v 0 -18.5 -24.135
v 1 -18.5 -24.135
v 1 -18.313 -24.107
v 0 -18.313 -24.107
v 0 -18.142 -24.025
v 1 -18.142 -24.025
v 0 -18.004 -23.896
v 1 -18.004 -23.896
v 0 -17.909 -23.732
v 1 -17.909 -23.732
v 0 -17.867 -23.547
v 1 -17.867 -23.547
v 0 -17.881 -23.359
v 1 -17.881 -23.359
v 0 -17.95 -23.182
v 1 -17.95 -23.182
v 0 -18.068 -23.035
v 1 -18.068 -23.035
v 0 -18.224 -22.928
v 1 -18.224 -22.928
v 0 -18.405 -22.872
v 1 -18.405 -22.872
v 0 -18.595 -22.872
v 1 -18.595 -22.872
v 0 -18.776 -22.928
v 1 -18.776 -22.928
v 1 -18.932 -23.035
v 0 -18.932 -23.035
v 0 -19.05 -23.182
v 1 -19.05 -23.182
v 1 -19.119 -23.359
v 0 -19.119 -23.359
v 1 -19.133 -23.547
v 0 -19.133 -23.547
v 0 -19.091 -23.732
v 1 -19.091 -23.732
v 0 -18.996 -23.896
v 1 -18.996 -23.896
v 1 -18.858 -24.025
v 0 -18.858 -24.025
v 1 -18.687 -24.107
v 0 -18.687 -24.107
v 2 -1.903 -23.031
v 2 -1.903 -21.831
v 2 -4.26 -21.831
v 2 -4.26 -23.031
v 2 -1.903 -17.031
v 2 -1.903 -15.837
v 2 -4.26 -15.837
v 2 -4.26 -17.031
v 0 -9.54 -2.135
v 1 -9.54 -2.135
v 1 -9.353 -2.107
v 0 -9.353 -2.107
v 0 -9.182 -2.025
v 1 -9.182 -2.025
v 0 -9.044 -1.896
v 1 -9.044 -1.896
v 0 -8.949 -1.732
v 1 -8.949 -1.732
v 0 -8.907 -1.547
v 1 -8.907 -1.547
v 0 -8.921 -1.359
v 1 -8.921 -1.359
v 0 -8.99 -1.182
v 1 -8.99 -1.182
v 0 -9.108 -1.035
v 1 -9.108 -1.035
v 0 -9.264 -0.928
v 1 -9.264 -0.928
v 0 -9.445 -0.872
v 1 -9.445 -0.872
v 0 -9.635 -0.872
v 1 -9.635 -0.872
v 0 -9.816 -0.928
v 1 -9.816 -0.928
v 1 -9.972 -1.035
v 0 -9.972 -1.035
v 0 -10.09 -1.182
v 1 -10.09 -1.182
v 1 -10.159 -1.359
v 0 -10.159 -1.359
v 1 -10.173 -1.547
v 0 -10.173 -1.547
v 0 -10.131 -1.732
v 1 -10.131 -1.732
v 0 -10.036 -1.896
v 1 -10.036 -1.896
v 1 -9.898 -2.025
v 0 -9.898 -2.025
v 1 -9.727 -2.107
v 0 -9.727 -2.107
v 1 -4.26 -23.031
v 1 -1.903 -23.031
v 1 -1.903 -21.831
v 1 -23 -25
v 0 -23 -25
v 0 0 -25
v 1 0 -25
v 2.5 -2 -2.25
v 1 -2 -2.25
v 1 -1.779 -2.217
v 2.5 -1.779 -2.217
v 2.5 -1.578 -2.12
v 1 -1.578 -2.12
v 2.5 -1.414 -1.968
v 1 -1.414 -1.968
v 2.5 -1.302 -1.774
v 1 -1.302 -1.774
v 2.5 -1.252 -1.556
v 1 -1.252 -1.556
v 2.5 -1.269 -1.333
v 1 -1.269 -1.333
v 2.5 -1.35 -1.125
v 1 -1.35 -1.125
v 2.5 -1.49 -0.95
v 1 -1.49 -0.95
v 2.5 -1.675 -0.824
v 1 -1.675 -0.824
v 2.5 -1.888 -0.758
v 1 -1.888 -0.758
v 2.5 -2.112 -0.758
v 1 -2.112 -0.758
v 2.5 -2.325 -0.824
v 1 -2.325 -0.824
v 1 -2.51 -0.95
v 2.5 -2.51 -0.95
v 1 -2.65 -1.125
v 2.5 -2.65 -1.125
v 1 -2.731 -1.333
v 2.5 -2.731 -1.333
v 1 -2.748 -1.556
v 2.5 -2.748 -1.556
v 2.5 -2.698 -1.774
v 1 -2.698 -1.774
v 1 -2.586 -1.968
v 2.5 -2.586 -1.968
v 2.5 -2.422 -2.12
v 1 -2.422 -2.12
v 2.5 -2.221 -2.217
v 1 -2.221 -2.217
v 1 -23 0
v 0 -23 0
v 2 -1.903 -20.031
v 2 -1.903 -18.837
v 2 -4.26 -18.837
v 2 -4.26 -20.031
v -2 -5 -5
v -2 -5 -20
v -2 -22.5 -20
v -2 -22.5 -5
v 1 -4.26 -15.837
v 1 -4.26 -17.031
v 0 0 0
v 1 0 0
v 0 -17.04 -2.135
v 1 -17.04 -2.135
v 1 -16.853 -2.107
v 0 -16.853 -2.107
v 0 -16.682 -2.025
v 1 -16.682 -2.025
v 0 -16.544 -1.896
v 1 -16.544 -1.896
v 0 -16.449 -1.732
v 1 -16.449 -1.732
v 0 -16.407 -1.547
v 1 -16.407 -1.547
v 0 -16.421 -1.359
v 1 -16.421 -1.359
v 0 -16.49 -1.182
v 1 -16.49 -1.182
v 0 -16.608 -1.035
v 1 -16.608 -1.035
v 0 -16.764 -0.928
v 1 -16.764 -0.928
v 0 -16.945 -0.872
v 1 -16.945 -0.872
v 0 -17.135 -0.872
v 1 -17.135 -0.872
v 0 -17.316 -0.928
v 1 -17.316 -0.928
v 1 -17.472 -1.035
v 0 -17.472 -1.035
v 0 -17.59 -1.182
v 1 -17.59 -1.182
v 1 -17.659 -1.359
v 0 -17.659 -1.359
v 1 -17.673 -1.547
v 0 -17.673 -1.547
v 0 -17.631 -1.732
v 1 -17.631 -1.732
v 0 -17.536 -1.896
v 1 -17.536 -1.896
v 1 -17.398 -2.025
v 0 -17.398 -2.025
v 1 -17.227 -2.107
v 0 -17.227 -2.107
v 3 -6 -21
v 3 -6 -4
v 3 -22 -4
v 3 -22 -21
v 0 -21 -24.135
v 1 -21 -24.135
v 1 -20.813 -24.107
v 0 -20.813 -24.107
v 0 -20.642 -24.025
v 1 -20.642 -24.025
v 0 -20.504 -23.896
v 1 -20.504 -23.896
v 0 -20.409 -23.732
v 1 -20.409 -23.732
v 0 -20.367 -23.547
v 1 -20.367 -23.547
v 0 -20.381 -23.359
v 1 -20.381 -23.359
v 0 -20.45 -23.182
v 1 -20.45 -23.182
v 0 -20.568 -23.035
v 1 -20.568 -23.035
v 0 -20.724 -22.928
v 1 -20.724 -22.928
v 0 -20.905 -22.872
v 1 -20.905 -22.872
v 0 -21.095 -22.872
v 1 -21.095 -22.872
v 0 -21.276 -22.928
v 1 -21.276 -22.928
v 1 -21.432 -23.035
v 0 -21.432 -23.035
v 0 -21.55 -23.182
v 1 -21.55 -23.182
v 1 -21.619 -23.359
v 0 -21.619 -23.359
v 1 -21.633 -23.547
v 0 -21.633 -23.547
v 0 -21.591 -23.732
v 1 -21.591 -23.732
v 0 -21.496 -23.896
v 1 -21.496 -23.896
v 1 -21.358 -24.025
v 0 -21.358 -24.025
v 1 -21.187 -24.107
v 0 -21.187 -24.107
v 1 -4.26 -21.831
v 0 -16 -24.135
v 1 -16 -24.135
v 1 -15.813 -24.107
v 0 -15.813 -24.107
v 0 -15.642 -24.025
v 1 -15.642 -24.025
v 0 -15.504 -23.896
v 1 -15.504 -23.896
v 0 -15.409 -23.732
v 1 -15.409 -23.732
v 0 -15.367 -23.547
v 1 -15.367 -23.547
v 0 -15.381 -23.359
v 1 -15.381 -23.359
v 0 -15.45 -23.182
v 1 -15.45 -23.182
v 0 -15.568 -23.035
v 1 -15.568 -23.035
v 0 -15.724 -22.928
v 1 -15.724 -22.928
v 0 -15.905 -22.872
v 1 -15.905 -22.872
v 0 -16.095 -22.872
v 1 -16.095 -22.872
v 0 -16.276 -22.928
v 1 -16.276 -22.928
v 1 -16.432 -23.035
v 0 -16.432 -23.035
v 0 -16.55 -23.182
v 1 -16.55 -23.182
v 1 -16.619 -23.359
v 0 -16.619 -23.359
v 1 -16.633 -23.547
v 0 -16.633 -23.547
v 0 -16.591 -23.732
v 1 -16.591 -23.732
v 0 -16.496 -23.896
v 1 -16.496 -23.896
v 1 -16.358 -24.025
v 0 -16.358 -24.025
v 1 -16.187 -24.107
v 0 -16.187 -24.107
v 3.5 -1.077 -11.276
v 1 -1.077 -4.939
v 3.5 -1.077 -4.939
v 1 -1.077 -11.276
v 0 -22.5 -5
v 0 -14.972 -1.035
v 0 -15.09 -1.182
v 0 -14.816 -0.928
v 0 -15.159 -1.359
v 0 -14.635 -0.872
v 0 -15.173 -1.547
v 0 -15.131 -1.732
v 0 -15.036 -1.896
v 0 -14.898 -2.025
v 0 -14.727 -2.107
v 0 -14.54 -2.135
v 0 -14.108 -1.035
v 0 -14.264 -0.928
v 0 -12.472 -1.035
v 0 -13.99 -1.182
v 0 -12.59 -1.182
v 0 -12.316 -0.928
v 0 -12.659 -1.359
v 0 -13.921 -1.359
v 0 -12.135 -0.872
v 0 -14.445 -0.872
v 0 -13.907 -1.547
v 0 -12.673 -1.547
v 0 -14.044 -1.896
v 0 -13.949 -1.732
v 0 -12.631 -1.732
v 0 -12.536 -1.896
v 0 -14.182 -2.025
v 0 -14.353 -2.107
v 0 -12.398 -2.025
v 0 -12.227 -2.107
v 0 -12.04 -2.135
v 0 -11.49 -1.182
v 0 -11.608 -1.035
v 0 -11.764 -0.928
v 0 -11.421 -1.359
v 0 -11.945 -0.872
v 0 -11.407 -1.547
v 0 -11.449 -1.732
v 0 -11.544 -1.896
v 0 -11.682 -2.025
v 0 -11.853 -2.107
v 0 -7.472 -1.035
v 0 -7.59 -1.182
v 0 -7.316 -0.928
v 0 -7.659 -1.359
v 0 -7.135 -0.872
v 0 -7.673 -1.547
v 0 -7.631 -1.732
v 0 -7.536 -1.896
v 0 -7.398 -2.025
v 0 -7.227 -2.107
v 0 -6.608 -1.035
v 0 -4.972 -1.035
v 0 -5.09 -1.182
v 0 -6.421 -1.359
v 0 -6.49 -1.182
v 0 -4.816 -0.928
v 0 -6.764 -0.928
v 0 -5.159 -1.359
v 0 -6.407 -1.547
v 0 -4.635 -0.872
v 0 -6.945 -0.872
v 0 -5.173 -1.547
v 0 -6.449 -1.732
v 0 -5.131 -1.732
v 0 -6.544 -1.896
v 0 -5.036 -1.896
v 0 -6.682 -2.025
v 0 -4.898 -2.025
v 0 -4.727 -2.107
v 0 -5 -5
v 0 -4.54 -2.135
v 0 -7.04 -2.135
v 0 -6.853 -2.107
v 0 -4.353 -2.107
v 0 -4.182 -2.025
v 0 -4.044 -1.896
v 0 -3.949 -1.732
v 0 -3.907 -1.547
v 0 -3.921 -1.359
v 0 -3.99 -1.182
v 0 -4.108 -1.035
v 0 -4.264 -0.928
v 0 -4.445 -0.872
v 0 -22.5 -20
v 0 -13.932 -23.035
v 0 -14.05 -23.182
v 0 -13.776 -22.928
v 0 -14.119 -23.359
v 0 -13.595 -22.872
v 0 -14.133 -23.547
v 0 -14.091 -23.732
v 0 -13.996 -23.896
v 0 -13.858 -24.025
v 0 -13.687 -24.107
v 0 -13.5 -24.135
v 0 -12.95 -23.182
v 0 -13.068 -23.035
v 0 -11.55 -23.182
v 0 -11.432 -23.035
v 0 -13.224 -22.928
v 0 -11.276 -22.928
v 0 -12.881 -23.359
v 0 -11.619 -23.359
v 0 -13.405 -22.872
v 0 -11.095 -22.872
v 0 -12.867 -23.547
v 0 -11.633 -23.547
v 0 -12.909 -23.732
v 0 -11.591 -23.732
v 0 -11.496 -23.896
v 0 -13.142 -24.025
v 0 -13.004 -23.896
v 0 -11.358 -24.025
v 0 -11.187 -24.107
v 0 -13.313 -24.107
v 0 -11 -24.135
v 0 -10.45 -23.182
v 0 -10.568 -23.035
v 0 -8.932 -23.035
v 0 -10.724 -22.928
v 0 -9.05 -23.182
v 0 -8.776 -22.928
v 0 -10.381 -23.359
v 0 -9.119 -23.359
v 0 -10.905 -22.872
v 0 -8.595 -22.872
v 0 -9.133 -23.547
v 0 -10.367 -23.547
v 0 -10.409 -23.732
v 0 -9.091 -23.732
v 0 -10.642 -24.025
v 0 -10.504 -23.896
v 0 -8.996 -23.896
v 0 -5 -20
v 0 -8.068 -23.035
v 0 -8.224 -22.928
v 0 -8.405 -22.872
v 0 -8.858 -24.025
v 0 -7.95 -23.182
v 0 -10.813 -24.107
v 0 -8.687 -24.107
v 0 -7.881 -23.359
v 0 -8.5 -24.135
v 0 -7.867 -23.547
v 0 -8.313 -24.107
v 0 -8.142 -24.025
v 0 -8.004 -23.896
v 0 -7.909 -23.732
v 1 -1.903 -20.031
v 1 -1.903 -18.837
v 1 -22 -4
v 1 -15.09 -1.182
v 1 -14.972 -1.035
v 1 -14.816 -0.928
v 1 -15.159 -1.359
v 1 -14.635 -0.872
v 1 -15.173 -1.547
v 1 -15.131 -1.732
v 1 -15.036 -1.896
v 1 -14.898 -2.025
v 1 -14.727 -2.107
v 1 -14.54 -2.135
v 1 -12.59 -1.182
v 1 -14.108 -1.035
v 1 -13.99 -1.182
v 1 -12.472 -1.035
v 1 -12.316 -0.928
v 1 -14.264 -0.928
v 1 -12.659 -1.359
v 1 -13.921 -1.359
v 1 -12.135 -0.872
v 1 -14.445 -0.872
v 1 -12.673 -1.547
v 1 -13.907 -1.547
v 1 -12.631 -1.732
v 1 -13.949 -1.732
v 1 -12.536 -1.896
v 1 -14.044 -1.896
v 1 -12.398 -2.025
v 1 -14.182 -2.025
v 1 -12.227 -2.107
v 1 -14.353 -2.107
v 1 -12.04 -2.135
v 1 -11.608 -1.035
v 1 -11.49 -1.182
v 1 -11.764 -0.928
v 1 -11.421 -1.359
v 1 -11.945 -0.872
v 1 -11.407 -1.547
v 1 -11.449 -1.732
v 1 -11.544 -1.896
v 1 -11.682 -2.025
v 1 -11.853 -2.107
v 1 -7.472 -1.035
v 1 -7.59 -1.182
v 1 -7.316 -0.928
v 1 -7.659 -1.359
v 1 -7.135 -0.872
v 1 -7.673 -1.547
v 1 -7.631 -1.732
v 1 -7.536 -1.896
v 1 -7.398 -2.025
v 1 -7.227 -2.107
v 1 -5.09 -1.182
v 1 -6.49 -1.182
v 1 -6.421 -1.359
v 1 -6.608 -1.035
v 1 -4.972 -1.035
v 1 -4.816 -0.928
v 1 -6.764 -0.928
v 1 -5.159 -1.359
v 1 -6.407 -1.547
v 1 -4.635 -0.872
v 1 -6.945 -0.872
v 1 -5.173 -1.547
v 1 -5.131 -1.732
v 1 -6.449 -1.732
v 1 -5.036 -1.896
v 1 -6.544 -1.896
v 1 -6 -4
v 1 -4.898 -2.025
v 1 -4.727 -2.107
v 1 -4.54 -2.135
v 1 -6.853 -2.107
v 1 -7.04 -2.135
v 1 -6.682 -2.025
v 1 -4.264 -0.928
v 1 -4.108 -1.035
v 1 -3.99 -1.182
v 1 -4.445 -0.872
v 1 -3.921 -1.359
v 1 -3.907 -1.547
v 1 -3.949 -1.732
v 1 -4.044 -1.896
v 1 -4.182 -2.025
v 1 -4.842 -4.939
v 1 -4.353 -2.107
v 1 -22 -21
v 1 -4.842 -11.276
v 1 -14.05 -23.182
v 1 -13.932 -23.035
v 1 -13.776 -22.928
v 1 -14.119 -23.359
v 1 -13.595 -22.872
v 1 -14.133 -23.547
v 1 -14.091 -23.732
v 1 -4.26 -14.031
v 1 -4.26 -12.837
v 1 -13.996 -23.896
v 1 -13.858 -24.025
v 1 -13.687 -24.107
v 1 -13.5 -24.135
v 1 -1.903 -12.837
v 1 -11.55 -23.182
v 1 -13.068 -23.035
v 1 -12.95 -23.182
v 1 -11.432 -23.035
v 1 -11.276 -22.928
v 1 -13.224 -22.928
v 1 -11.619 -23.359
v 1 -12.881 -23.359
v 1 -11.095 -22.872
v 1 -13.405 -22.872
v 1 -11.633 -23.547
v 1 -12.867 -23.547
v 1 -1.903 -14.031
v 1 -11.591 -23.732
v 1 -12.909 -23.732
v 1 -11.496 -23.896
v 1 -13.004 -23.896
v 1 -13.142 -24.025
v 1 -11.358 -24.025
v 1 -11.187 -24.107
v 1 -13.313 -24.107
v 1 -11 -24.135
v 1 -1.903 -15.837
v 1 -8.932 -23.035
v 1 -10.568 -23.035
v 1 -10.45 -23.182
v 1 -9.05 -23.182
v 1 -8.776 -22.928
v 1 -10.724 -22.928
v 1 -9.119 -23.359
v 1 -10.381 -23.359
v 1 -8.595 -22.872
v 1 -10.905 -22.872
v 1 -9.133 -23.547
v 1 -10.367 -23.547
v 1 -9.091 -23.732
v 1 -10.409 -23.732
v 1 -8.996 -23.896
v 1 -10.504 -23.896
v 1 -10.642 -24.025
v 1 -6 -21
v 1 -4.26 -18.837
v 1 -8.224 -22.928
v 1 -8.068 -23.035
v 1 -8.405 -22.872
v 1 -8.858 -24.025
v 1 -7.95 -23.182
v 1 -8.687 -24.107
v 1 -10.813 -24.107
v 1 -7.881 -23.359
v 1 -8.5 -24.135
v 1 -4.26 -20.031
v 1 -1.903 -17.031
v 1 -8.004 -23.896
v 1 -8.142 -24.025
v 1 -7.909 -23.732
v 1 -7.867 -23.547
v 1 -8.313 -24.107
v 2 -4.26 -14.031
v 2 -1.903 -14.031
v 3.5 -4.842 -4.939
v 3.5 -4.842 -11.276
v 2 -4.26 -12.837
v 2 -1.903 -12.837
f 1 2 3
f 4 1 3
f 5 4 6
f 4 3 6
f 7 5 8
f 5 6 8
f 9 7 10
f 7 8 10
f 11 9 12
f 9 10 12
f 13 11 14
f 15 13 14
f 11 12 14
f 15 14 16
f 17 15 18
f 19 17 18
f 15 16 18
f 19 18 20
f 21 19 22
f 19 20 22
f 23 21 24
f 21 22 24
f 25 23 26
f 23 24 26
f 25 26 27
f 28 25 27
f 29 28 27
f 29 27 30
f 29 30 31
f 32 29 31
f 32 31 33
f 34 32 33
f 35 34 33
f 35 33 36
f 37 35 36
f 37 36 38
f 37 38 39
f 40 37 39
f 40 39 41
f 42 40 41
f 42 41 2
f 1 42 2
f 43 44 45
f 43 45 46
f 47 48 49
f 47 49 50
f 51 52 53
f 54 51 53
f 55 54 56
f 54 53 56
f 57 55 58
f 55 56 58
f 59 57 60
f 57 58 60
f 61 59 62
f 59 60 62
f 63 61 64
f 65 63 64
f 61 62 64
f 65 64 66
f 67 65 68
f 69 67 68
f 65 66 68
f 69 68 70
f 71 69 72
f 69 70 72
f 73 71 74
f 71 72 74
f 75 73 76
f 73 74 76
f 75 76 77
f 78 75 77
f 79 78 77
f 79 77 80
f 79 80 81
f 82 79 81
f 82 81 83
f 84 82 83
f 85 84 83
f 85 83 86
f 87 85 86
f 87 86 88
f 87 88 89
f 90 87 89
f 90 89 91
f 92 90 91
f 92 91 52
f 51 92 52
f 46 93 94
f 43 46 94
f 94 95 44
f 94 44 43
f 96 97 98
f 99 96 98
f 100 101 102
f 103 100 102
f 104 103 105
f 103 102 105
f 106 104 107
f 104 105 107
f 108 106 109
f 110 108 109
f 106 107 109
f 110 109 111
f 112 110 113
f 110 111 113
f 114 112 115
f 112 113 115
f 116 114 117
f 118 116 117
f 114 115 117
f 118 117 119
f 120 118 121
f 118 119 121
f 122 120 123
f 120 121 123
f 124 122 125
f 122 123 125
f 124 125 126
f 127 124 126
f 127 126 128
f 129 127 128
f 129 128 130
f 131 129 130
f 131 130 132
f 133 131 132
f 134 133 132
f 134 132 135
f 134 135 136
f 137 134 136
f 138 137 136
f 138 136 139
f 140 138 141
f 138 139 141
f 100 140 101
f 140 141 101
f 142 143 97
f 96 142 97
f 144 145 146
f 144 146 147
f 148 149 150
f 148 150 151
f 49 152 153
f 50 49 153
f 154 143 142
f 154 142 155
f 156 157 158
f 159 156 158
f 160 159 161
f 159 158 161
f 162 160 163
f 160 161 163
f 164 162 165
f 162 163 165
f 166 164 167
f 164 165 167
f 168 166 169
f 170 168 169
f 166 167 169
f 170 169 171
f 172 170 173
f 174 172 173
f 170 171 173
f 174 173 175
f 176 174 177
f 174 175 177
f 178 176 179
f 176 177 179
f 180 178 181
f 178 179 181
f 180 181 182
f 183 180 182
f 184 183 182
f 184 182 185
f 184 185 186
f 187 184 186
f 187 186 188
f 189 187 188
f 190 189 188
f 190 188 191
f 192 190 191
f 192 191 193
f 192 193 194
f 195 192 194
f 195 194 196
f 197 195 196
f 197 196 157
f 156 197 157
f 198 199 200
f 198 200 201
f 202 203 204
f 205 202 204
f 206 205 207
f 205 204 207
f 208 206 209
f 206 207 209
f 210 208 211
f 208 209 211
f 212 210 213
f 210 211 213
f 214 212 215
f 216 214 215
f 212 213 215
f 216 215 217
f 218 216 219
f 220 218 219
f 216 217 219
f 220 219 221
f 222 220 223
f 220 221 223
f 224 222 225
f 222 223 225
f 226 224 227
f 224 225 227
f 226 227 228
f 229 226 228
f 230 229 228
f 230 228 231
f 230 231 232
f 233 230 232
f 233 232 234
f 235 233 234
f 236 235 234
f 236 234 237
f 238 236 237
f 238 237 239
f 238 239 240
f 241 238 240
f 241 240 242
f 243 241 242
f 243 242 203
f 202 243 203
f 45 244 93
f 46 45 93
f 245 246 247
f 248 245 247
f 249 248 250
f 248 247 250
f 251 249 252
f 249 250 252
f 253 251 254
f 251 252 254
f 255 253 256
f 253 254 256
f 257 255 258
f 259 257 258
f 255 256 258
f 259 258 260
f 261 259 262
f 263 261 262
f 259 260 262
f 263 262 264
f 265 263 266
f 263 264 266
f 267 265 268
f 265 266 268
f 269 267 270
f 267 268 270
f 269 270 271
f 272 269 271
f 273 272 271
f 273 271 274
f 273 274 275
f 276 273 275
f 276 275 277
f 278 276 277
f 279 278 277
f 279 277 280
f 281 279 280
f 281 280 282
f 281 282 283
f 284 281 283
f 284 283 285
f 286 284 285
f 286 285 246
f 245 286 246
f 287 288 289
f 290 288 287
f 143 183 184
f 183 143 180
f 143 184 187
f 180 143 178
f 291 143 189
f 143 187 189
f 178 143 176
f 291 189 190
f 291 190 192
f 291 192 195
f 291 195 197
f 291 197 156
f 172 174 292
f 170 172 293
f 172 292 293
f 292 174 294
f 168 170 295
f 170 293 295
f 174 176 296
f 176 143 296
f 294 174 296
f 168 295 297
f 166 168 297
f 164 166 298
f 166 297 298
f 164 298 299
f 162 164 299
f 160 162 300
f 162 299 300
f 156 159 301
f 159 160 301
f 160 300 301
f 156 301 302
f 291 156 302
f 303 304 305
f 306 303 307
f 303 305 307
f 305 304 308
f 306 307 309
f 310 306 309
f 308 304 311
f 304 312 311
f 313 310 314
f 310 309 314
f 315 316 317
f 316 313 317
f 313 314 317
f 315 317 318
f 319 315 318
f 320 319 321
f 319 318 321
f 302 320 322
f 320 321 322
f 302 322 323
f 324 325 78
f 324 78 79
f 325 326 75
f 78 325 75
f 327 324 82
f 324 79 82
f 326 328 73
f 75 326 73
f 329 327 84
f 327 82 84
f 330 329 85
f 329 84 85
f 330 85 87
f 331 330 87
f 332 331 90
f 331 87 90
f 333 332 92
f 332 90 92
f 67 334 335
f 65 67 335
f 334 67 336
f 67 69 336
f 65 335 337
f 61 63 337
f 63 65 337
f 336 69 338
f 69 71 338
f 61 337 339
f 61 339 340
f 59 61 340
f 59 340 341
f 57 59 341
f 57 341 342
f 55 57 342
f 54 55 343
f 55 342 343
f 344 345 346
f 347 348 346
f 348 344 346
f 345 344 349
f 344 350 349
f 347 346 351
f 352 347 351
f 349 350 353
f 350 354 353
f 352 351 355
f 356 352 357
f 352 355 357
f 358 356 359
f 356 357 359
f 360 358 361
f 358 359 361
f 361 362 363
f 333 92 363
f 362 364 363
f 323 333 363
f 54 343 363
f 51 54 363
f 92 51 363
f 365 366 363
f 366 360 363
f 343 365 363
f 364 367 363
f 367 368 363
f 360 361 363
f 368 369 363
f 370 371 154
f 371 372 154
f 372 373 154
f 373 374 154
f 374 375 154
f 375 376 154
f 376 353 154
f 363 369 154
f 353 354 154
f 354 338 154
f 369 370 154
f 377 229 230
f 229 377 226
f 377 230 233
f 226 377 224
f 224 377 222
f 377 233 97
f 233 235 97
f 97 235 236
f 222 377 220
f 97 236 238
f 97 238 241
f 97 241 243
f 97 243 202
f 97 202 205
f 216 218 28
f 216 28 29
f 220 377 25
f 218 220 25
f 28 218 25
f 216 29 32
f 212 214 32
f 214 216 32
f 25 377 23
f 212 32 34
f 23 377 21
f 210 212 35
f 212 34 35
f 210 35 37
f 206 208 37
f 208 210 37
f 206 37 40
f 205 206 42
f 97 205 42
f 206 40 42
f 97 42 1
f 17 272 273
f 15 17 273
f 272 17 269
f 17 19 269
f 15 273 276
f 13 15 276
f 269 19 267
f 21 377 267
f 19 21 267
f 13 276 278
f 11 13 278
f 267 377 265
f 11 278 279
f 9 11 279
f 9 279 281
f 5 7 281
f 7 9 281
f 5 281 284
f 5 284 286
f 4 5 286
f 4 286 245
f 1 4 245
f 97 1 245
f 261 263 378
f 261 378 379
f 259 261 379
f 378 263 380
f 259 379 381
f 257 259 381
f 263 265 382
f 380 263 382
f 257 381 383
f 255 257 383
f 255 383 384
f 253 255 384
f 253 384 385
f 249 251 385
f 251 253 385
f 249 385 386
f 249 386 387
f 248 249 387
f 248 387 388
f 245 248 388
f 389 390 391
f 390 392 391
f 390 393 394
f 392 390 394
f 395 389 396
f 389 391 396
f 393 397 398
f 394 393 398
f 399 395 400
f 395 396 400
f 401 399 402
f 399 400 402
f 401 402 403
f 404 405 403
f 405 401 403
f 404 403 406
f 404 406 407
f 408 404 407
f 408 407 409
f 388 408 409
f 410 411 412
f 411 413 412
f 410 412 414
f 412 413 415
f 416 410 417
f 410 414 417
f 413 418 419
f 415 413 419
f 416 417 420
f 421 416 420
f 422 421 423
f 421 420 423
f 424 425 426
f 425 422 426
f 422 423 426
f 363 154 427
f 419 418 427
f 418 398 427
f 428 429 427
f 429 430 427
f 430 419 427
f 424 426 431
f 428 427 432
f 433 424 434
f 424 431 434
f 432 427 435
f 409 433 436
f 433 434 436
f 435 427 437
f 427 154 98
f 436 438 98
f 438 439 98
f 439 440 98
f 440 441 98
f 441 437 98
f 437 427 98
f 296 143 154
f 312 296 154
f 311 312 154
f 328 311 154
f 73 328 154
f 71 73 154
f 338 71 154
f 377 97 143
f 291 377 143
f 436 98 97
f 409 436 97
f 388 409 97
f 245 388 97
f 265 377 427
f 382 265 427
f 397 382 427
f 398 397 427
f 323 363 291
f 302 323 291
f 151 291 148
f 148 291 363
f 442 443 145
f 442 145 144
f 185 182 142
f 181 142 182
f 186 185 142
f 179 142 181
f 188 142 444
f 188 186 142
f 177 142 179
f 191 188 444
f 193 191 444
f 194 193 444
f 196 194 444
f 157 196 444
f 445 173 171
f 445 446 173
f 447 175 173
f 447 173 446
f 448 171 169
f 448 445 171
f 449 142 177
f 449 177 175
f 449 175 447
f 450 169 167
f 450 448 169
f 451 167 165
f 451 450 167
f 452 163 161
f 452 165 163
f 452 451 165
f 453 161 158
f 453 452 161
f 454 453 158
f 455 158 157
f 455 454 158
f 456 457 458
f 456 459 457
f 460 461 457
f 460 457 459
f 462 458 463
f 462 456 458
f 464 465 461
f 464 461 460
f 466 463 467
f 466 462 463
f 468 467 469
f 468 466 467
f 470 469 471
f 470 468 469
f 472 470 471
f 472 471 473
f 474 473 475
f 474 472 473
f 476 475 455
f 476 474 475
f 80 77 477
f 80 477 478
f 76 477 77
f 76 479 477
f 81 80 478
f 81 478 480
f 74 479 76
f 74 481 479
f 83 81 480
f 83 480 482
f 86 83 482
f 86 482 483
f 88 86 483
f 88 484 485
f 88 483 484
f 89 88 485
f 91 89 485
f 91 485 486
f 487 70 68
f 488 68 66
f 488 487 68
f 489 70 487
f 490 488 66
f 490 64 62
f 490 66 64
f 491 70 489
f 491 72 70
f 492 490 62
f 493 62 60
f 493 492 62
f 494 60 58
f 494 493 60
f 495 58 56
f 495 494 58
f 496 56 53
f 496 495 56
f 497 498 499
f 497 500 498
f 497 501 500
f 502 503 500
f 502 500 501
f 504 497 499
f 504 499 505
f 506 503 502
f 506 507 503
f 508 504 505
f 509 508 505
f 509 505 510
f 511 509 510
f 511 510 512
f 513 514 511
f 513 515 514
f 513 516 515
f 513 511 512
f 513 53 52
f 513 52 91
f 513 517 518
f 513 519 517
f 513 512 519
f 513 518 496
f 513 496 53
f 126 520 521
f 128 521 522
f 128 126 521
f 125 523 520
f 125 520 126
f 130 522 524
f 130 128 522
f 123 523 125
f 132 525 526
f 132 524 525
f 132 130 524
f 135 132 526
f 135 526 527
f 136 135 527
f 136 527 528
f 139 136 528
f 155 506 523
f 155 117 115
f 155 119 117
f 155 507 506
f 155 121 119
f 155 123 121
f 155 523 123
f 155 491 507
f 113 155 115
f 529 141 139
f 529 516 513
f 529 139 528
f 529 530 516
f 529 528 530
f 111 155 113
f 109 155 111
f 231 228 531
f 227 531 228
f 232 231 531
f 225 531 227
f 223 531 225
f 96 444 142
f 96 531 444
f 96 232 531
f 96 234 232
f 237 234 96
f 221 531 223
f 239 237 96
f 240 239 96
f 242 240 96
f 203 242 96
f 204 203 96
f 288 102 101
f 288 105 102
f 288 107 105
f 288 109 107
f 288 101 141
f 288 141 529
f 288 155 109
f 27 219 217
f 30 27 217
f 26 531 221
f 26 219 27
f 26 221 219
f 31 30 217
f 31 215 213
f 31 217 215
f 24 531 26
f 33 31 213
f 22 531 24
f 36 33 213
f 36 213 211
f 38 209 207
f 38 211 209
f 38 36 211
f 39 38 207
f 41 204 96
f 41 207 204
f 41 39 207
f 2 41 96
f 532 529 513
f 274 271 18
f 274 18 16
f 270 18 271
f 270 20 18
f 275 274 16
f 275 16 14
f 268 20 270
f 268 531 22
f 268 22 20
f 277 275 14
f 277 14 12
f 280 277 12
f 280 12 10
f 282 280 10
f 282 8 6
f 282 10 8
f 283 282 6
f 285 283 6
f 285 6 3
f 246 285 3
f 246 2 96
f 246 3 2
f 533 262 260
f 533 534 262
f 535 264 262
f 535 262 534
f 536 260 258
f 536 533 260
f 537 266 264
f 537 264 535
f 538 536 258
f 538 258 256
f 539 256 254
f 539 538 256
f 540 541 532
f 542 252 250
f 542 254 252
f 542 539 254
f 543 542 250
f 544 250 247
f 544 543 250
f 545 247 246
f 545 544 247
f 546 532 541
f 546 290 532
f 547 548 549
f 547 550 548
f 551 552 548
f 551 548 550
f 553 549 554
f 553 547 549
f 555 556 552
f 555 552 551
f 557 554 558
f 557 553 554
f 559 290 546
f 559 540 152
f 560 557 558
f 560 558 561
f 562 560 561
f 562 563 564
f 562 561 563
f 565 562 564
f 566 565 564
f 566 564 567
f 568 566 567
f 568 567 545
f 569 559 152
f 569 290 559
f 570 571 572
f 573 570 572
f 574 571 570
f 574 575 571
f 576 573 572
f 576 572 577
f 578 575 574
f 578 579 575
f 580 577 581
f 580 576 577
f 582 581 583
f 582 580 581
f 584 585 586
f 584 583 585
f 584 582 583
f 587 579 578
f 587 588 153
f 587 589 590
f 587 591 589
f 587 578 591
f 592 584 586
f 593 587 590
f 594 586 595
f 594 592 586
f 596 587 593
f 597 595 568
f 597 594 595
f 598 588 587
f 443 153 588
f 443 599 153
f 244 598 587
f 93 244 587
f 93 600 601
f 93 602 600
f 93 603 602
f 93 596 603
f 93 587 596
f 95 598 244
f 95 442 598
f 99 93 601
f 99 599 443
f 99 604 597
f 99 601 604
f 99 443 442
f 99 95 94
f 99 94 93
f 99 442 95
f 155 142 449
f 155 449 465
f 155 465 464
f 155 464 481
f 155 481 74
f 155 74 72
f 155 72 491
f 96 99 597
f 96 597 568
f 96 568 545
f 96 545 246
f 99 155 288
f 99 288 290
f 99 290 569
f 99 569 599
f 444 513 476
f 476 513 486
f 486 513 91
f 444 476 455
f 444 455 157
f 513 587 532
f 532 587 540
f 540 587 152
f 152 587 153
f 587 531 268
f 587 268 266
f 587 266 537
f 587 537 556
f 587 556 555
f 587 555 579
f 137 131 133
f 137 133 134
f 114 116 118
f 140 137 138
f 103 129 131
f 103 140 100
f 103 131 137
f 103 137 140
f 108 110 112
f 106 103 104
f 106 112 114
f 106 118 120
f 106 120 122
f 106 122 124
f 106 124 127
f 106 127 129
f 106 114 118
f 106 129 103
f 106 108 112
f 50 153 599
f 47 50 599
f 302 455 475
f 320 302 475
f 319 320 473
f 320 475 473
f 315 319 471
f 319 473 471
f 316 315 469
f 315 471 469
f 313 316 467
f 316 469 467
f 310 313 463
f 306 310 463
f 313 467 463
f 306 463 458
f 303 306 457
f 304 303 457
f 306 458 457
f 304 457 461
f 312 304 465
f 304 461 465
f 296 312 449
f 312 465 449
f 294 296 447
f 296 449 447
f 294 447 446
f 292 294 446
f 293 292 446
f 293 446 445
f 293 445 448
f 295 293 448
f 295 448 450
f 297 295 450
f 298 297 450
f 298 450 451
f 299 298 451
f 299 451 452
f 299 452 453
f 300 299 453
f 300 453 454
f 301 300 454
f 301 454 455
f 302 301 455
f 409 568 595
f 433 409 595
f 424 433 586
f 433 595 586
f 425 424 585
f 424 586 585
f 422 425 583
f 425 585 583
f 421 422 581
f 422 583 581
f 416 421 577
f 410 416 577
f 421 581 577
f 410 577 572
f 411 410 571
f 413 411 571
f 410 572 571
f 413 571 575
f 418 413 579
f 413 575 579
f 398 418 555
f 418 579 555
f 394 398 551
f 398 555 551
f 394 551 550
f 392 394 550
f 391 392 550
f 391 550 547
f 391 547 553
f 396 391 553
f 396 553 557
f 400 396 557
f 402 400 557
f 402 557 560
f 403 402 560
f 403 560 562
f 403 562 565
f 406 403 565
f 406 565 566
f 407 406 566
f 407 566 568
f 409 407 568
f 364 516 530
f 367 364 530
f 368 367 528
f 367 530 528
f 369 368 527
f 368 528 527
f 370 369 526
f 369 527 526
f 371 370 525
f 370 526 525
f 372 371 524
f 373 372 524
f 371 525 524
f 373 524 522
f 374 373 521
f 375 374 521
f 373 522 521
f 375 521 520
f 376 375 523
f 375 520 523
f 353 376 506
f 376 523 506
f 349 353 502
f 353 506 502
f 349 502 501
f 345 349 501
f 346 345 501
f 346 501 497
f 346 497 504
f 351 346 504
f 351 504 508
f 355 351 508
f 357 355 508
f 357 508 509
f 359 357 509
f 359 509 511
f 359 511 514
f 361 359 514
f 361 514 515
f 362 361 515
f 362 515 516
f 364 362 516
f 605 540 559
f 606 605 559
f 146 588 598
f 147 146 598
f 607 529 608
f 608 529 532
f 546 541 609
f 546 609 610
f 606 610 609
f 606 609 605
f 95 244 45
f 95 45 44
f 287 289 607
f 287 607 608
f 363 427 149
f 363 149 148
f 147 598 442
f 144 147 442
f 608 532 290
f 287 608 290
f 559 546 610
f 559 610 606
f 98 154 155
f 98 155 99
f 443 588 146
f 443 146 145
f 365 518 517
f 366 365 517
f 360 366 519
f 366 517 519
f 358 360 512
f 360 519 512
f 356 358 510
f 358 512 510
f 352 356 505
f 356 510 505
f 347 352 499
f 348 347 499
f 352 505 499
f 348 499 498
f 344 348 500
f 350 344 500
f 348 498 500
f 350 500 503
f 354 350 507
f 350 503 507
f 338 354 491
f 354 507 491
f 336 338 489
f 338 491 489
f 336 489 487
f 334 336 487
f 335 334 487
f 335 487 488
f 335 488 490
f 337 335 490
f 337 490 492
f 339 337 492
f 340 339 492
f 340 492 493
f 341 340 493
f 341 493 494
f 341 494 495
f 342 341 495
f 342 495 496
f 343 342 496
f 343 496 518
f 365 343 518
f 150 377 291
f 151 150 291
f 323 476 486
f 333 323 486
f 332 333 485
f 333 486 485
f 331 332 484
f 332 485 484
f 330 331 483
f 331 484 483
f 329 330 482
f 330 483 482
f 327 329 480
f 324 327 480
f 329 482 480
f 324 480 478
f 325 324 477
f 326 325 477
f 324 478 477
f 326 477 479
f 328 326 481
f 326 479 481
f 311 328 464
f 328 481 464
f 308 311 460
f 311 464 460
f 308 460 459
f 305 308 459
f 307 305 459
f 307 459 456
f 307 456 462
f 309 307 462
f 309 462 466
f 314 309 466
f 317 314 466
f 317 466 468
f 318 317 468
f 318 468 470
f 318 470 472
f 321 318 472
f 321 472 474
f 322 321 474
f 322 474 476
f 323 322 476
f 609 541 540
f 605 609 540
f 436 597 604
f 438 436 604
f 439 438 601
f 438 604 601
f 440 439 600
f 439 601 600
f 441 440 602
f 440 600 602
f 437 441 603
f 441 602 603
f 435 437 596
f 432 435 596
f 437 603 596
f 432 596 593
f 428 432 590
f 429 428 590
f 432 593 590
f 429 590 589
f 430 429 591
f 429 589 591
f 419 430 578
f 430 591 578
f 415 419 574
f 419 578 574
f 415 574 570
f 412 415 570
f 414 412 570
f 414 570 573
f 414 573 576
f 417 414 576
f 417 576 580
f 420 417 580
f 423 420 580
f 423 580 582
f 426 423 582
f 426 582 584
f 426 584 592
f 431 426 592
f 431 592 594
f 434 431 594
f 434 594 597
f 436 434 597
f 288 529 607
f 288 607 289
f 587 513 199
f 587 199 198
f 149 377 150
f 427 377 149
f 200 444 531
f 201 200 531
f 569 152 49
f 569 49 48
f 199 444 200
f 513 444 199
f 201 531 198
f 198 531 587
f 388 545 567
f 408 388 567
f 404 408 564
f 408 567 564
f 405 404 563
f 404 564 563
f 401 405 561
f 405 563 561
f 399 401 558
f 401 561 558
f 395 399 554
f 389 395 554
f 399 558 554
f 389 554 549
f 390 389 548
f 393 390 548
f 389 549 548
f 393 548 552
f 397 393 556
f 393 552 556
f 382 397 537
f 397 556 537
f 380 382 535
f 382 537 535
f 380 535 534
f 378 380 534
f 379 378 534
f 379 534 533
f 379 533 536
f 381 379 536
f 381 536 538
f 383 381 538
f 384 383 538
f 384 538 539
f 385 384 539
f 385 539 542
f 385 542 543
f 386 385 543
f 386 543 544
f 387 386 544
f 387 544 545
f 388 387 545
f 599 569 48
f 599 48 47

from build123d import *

# Parameters (mm, degrees)
SKETCH1_W           = 25
SKETCH1_H           = 23
BOSS_EXTRUDE1_DEPTH = 1
SKETCH2_W           = 17
SKETCH2_H           = 16
BOSS_EXTRUDE2_DEPTH = 2
SKETCH3_W           = 6.336645523
SKETCH3_H           = 3.765253137
BOSS_EXTRUDE3_DEPTH = 2.5
SKETCH4_W           = 1.193860751
SKETCH4_H           = 2.357109687
BOSS_EXTRUDE4_DEPTH = 1
SKETCH5_W           = 1.2
SKETCH5_H           = 2.357109687
BOSS_EXTRUDE5_DEPTH = 1
SKETCH6_R           = 0.75
BOSS_EXTRUDE6_DEPTH = 1.5
SKETCH7_R           = 0.635
CUT_EXTRUDE1_DEPTH  = 1.5
SKETCH8_W           = 15
SKETCH8_H           = 17.5
BOSS_EXTRUDE7_DEPTH = 2


with BuildPart() as part:
    # Sketch1 → Boss-Extrude1 (new body)
    with BuildSketch(Plane(origin=(0, 0, 0), x_dir=(0, 0, -1), z_dir=(1, 0, 0))):
        with Locations((12.5, -11.5)):
            Rectangle(SKETCH1_W, SKETCH1_H)
    extrude(amount=BOSS_EXTRUDE1_DEPTH)

    # Sketch2 → Boss-Extrude2 (add)
    with BuildSketch(Plane(origin=(1, 0, 0), x_dir=(0, 0, -1), z_dir=(1, 0, 0))):
        with Locations((12.5, -14)):
            Rectangle(SKETCH2_W, SKETCH2_H)
    extrude(amount=BOSS_EXTRUDE2_DEPTH)

    # Sketch3 → Boss-Extrude3 (add)
    with BuildSketch(Plane(origin=(1, 0, 0), x_dir=(0, 0, -1), z_dir=(1, 0, 0))):
        with Locations((8.107204674, -2.95930386)):
            Rectangle(SKETCH3_W, SKETCH3_H)
    extrude(amount=BOSS_EXTRUDE3_DEPTH)

    # Sketch4 → Boss-Extrude4 (add)
    with BuildSketch(Plane(origin=(1, 0, 0), x_dir=(0, 0, -1), z_dir=(1, 0, 0))):
        with Locations((16.433660331, -3.081751116)):
            Rectangle(SKETCH4_W, SKETCH4_H)
        with Locations((13.433660331, -3.081751116)):
            Rectangle(SKETCH4_W, SKETCH4_H)
        with Locations((19.433660331, -3.081751116)):
            Rectangle(SKETCH4_W, SKETCH4_H)
    extrude(amount=BOSS_EXTRUDE4_DEPTH)

    # Sketch5 → Boss-Extrude5 (add)
    with BuildSketch(Plane(origin=(1, 0, 0), x_dir=(0, 0, -1), z_dir=(1, 0, 0))):
        with Locations((22.430590706, -3.081751116)):
            Rectangle(SKETCH5_W, SKETCH5_H)
    extrude(amount=BOSS_EXTRUDE5_DEPTH)

    # Sketch6 → Boss-Extrude6 (add)
    with BuildSketch(Plane(origin=(1, 0, 0), x_dir=(0, 0, -1), z_dir=(1, 0, 0))):
        with Locations((1.5, -2)):
            Circle(SKETCH6_R)
    extrude(amount=BOSS_EXTRUDE6_DEPTH)

    # Sketch7 → Cut-Extrude1 (cut)
    with BuildSketch(Plane(origin=(1, 0, 0), x_dir=(0, 0, -1), z_dir=(1, 0, 0))):
        with Locations((1.5, -4.54)):
            Circle(SKETCH7_R)
        with Locations((1.5, -7.04)):
            Circle(SKETCH7_R)
        with Locations((1.5, -9.54)):
            Circle(SKETCH7_R)
        with Locations((1.5, -12.04)):
            Circle(SKETCH7_R)
        with Locations((1.5, -14.54)):
            Circle(SKETCH7_R)
        with Locations((1.5, -17.04)):
            Circle(SKETCH7_R)
        with Locations((23.5, -21)):
            Circle(SKETCH7_R)
        with Locations((23.5, -18.5)):
            Circle(SKETCH7_R)
        with Locations((23.5, -16)):
            Circle(SKETCH7_R)
        with Locations((23.5, -13.5)):
            Circle(SKETCH7_R)
        with Locations((23.5, -11)):
            Circle(SKETCH7_R)
        with Locations((23.5, -8.5)):
            Circle(SKETCH7_R)
    extrude(amount=-CUT_EXTRUDE1_DEPTH, mode=Mode.SUBTRACT)

    # Sketch8 → Boss-Extrude7 (add)
    with BuildSketch(Plane.ZY):
        with Locations((-12.5, -13.75)):
            Rectangle(SKETCH8_W, SKETCH8_H)
    extrude(amount=BOSS_EXTRUDE7_DEPTH)


solid = part.part
